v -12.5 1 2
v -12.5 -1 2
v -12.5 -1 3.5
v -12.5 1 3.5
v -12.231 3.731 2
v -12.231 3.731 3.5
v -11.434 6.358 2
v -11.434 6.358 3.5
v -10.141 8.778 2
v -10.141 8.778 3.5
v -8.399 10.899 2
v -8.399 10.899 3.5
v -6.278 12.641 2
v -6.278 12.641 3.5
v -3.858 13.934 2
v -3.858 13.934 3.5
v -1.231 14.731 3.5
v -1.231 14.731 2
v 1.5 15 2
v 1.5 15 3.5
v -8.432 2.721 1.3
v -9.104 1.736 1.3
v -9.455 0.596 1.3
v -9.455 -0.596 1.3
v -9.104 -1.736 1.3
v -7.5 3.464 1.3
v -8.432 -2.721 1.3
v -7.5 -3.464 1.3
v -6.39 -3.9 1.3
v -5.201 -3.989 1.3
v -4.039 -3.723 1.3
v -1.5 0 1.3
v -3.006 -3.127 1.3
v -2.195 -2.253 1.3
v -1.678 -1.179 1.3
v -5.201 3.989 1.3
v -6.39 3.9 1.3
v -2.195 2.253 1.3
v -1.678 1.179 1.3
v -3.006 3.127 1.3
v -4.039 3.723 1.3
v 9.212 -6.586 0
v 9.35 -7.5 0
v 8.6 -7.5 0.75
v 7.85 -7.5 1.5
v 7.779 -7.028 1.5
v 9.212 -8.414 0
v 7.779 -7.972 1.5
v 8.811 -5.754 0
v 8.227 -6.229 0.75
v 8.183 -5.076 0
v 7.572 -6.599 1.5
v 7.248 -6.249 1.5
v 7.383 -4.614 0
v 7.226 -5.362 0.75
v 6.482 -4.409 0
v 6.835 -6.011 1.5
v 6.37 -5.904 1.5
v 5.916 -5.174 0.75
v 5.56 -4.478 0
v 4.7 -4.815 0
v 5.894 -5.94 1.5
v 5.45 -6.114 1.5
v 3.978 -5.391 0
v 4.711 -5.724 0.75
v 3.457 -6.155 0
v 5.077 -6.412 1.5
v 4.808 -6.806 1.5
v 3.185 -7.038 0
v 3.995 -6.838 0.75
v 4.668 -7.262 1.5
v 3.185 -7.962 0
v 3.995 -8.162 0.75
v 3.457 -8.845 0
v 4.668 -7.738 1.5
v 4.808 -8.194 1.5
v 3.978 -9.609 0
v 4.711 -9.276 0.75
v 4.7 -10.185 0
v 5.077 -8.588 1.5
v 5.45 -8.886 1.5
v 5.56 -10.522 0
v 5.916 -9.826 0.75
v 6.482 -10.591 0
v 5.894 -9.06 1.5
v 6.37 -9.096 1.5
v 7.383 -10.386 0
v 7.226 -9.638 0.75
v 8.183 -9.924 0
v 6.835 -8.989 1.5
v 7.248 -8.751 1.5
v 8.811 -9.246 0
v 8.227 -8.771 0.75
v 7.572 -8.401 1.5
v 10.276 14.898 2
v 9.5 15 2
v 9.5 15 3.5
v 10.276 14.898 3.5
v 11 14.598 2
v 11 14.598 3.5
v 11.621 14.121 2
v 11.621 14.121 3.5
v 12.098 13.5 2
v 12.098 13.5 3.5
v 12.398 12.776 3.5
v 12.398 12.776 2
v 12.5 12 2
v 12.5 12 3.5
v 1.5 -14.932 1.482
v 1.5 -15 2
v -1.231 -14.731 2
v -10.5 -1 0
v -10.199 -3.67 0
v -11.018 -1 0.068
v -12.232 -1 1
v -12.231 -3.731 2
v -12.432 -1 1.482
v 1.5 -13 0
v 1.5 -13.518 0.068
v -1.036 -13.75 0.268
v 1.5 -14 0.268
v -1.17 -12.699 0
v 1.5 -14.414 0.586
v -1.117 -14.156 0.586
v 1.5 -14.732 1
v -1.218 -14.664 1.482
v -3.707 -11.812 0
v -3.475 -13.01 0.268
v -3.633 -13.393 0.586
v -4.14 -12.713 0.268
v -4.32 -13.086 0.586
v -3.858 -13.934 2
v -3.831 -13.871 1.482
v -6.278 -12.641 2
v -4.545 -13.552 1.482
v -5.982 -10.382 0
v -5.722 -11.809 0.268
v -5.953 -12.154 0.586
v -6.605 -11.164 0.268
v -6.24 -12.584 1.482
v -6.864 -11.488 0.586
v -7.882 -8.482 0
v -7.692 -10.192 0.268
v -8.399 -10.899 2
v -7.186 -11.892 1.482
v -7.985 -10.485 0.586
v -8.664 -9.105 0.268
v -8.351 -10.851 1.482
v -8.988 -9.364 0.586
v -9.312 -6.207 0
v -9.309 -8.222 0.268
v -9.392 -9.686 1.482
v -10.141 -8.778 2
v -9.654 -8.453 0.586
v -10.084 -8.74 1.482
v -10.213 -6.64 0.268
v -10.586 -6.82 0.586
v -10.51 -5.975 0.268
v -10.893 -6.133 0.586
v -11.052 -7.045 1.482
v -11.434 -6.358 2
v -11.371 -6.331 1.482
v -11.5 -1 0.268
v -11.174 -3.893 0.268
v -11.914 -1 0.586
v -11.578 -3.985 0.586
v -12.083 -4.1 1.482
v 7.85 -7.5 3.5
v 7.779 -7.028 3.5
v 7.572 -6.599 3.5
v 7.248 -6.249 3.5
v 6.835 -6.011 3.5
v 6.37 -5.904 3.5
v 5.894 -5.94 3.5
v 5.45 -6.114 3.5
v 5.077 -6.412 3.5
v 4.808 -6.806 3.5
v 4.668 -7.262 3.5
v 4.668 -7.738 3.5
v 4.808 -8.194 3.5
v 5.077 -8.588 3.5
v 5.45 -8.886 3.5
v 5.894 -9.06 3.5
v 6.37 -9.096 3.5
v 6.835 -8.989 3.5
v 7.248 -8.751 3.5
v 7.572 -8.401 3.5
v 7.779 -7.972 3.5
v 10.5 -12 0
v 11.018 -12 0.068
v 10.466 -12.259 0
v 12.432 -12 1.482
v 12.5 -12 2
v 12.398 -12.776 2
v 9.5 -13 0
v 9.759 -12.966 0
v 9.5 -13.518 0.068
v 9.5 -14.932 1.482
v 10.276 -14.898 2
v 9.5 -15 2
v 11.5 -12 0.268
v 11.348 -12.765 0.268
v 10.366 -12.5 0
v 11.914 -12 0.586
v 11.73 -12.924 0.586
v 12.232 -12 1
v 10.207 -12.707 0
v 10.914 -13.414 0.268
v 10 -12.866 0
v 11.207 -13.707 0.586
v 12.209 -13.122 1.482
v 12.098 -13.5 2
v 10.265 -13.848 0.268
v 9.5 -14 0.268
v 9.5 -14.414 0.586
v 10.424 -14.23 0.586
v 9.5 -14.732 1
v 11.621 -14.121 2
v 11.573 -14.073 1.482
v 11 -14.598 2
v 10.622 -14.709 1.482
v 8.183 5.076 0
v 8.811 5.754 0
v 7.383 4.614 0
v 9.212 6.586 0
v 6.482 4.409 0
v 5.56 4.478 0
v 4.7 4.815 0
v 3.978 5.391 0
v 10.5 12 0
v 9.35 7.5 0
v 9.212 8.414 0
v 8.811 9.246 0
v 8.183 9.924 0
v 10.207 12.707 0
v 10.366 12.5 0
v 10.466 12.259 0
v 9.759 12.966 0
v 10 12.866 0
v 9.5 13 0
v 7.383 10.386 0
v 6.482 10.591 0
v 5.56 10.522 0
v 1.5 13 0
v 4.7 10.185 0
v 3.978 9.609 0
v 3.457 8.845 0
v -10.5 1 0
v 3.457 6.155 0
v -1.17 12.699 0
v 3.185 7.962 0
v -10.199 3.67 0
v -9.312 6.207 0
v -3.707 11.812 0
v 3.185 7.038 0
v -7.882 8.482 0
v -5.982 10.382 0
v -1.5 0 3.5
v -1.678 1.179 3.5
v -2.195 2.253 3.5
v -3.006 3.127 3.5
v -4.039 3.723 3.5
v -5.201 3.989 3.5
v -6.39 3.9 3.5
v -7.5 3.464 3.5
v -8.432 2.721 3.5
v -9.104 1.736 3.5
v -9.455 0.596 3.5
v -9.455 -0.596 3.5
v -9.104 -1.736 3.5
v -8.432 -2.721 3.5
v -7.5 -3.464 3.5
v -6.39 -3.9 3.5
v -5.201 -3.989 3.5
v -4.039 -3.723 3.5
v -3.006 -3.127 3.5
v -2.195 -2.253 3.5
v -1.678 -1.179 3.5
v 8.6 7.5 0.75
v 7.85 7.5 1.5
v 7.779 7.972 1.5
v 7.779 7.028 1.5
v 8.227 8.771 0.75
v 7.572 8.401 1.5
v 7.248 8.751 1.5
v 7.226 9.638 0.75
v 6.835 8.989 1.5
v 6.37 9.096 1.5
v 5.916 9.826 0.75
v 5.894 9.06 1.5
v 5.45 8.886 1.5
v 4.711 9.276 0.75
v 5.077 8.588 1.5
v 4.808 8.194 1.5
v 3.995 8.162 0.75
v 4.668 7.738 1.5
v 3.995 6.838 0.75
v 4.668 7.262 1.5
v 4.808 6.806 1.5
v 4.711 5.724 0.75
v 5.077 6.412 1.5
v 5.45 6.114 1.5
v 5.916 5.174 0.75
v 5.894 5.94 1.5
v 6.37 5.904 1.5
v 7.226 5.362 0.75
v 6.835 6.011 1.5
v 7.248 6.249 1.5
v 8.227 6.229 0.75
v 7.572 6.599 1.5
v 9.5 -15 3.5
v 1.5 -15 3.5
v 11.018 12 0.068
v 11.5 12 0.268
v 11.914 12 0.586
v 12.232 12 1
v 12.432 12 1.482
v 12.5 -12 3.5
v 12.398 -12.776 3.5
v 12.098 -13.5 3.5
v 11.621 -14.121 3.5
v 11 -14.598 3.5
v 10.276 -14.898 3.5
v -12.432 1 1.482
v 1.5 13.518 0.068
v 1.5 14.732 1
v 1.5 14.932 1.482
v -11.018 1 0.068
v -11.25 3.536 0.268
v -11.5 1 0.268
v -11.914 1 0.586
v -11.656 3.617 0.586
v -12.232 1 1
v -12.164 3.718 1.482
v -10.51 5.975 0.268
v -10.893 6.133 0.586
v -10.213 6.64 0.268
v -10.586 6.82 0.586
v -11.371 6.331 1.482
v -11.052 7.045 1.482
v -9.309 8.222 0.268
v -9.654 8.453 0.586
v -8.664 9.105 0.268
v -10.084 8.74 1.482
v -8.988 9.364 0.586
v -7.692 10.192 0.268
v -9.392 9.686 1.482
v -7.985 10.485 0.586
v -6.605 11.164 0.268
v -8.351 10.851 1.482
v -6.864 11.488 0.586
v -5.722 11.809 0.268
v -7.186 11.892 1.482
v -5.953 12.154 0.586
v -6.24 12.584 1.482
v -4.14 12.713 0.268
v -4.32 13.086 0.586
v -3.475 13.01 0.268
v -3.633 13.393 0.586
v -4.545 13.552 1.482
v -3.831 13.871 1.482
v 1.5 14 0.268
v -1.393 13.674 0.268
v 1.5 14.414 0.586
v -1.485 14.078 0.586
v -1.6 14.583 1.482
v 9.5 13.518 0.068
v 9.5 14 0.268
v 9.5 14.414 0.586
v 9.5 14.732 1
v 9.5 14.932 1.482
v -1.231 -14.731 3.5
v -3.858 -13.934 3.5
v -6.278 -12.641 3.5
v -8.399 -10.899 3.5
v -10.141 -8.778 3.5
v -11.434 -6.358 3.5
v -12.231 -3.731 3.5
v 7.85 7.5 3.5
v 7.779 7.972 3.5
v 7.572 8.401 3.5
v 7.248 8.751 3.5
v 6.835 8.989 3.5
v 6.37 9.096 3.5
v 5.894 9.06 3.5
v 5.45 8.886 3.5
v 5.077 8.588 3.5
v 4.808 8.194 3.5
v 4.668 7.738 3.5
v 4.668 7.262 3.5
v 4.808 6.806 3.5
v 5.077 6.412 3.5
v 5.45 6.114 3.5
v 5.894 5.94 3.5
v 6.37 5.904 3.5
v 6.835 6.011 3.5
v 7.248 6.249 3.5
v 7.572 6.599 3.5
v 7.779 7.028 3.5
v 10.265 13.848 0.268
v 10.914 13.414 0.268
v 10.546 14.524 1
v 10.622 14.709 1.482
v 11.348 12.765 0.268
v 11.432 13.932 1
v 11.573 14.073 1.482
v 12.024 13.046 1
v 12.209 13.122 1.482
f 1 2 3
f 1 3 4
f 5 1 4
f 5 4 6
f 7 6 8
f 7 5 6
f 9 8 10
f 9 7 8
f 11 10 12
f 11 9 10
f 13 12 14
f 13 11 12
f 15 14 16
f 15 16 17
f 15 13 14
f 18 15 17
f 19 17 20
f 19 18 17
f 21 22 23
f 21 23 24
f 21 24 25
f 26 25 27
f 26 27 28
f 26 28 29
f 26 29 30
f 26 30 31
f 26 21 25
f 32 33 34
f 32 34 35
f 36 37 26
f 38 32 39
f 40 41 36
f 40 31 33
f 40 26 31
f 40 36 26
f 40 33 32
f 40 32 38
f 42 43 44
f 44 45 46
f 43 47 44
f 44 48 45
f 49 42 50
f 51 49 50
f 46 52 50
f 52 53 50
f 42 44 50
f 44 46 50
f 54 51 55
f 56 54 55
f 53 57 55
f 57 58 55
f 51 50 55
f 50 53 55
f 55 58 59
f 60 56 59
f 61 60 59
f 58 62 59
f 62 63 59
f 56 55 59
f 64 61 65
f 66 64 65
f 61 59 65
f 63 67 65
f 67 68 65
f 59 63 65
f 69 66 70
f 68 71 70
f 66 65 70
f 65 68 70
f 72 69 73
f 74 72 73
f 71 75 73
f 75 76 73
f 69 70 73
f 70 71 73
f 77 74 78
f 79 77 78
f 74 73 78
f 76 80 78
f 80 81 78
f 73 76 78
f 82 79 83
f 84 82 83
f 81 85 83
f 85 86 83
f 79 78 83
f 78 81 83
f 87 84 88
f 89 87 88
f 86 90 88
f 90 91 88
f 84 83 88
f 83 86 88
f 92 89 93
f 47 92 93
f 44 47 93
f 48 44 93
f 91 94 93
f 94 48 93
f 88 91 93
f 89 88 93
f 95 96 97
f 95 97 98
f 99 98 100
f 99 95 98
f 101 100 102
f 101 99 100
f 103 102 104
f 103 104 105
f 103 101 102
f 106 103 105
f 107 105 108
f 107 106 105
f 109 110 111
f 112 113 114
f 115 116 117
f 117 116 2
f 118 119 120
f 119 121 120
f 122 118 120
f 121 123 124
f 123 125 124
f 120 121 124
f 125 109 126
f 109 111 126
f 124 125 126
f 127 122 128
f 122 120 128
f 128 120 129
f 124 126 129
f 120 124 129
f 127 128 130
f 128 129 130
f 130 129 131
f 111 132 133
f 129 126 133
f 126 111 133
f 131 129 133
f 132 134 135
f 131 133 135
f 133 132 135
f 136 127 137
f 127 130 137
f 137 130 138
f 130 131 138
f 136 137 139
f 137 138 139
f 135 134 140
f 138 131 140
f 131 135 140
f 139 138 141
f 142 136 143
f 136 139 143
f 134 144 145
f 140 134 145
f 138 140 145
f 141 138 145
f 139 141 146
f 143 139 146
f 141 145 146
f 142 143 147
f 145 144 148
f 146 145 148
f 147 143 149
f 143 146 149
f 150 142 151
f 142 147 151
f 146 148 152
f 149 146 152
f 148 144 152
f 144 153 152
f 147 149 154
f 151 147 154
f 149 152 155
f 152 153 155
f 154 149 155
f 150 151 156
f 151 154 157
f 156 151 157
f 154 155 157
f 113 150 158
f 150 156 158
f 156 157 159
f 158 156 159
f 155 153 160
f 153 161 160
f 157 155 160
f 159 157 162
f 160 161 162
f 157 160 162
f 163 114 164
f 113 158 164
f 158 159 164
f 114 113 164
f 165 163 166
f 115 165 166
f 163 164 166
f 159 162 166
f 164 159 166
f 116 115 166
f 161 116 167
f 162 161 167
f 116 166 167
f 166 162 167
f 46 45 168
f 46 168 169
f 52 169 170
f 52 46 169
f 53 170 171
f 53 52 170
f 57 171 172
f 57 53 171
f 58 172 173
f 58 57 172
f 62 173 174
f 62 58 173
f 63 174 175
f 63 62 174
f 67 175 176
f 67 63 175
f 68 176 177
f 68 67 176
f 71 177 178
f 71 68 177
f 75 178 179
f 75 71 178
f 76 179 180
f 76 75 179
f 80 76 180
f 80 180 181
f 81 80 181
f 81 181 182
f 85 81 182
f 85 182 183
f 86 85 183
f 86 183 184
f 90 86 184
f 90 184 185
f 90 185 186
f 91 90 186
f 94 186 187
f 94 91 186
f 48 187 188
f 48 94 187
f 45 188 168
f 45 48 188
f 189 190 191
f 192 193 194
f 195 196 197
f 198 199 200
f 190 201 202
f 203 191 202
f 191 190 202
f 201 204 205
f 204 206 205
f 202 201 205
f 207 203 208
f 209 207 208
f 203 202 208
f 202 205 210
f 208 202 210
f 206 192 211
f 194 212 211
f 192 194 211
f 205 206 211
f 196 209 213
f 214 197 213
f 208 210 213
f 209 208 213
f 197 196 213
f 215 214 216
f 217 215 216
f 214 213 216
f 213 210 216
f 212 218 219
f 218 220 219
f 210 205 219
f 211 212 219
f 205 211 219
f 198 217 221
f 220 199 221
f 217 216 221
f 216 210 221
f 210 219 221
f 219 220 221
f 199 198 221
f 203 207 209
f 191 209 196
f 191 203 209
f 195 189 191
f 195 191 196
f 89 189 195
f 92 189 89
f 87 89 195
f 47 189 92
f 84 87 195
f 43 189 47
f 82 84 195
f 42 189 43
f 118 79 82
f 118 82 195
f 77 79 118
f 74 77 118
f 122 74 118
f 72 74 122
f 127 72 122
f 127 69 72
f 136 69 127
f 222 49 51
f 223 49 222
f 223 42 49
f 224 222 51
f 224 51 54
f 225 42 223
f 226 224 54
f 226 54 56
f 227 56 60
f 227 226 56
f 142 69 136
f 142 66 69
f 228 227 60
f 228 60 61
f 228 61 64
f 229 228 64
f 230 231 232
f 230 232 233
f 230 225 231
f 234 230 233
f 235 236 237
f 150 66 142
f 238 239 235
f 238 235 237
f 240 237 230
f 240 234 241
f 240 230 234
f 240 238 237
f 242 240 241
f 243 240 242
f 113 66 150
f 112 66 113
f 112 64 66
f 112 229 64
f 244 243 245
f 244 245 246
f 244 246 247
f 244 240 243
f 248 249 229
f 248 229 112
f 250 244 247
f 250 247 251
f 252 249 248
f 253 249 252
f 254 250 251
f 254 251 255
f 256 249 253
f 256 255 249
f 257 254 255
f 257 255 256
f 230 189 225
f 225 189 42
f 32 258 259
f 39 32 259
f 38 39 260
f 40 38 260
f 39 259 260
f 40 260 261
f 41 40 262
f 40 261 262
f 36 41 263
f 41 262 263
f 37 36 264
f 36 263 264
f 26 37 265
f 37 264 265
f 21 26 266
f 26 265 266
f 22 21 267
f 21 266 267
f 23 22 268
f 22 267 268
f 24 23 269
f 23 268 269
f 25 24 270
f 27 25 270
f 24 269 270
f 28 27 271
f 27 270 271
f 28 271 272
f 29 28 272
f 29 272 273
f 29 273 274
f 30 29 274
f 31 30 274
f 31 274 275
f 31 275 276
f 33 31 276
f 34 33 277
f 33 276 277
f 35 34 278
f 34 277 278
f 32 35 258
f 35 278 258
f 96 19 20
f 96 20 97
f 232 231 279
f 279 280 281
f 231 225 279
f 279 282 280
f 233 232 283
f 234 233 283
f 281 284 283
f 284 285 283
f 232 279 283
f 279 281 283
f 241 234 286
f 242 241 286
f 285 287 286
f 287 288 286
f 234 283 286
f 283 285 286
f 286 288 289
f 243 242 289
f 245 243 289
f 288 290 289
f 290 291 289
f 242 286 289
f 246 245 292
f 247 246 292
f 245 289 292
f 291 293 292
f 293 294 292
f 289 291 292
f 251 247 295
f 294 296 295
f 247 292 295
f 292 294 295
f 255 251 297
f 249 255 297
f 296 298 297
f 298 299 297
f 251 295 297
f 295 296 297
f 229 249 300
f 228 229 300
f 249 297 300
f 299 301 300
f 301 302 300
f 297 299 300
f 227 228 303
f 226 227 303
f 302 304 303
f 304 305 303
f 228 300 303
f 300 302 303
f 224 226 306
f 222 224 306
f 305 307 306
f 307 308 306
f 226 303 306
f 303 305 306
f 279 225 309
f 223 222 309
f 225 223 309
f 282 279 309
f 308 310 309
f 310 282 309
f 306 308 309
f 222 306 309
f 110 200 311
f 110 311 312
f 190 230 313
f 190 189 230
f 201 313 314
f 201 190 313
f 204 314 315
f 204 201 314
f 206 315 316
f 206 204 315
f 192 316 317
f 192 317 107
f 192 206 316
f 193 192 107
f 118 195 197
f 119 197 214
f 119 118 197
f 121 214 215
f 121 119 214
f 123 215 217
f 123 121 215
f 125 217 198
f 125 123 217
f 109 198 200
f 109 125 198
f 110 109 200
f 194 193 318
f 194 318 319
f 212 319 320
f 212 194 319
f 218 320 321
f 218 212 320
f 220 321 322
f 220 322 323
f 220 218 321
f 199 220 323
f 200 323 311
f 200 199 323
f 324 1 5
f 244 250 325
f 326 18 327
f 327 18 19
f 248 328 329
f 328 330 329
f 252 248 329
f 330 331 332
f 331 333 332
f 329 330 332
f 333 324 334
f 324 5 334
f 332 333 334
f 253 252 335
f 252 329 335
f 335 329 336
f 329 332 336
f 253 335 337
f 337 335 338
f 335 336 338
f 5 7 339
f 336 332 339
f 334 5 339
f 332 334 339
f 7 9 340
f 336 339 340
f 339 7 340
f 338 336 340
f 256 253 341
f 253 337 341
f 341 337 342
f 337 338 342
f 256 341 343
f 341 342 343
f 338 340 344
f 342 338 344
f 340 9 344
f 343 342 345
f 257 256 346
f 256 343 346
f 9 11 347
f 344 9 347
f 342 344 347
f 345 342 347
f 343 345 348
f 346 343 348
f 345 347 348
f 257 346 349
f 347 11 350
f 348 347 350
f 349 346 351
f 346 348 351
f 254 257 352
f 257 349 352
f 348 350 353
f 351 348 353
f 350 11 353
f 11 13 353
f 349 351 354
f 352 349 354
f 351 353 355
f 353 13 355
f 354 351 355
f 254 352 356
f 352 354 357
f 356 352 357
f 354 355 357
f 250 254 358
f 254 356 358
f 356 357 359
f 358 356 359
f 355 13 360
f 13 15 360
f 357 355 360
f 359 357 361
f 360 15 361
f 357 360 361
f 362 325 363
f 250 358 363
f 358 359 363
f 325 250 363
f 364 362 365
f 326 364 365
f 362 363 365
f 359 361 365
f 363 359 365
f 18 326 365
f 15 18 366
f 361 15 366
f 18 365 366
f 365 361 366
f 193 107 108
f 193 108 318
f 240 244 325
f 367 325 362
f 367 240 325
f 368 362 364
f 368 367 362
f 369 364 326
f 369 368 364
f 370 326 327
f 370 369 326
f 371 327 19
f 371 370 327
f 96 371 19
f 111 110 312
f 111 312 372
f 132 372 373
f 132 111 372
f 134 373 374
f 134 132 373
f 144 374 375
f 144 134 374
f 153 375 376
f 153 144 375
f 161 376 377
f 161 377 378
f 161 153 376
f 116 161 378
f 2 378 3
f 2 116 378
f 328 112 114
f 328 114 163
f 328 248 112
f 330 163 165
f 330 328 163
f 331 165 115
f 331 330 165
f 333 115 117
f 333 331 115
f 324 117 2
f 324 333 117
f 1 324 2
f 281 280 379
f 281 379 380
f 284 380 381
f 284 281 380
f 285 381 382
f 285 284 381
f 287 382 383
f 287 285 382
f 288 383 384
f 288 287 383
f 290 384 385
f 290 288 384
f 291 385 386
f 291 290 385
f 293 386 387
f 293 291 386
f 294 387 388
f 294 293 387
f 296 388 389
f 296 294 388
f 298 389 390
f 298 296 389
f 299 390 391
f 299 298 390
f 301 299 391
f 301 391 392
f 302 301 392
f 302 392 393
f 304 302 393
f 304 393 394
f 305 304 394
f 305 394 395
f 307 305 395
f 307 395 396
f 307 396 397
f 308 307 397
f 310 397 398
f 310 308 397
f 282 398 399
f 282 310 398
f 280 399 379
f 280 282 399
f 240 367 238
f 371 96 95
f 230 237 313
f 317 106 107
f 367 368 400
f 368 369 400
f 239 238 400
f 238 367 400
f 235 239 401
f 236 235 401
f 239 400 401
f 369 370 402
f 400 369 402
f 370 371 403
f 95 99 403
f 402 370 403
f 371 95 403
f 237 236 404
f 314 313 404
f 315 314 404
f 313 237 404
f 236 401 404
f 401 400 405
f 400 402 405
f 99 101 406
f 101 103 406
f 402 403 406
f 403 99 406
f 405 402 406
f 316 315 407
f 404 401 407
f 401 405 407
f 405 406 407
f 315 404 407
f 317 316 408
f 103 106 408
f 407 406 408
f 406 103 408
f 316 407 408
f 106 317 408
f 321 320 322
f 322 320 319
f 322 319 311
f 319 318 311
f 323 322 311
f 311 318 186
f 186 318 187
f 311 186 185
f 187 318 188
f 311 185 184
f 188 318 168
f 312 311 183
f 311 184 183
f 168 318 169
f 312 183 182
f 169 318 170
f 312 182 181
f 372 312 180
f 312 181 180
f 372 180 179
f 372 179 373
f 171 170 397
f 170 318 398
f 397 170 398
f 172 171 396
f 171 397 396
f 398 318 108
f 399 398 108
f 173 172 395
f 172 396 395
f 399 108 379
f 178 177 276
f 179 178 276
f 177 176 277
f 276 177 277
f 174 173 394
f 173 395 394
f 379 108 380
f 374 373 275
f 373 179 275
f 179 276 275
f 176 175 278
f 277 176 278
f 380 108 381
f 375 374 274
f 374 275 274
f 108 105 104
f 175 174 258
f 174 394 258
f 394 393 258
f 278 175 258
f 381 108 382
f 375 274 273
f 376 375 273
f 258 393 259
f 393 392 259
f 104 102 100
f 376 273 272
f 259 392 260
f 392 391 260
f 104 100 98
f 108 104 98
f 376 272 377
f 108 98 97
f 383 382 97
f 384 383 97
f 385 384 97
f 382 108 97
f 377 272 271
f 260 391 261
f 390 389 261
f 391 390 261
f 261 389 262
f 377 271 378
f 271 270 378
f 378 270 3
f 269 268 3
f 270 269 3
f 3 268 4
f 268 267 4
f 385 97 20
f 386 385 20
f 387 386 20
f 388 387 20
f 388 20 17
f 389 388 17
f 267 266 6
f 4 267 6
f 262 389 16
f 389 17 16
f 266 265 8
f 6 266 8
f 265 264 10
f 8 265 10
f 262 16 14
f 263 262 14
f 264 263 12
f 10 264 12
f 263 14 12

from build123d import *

# Parameters (mm, degrees)
SKETCH_1_R          = 1.6
EXTRUDE_1_DEPTH     = 3.5
SKETCH_2_R          = 4
CUT_EXTRUDE_1_DEPTH = 2.2
FILLET_1_R          = 2
CHAMFER_1_SIZE      = 1.5


with BuildPart() as part:
    # Эскиз1 → Бобышка-Вытянуть1 (new body)
    with BuildSketch(Plane.XY):
        with BuildLine():
            Line((1.5, 15), (9.5, 15))
            ThreePointArc((9.5, 15), (11.621320344, 14.121320344), (12.5, 12))
            Line((12.5, 12), (12.5, -12))
            ThreePointArc((12.5, -12), (11.621320344, -14.121320344), (9.5, -15))
            Line((9.5, -15), (1.5, -15))
            ThreePointArc((1.5, -15), (-8.399494937, -10.899494937), (-12.5, -1))
            Line((-12.5, -1), (-12.5, 1))
            ThreePointArc((-12.5, 1), (-8.399494937, 10.899494937), (1.5, 15))
        make_face()
        with Locations((6.25, 7.5)):
            Circle(SKETCH_1_R, mode=Mode.SUBTRACT)
        with Locations((6.25, -7.5)):
            Circle(SKETCH_1_R, mode=Mode.SUBTRACT)
    extrude(amount=EXTRUDE_1_DEPTH)

    # Эскиз2 → Вырез-Вытянуть1 (cut)
    with BuildSketch(Plane.XY.offset(3.5)):
        with Locations((-5.5, 0)):
            Circle(SKETCH_2_R)
    extrude(amount=-CUT_EXTRUDE_1_DEPTH, mode=Mode.SUBTRACT)

    # Скругление1
    fillet_1_edges = [part.edges().sort_by_distance(p)[0] for p in [
        (12.5, 0, 0),
        (11.621320344, -14.121320344, 0),
        (5.5, -15, 0),
        (-8.399494937, -10.899494937, 0),
        (-12.5, 0, 0),
        (-8.399494937, 10.899494937, 0),
        (5.5, 15, 0),
        (11.621320344, 14.121320344, 0),
    ]]
    fillet(fillet_1_edges, radius=FILLET_1_R)

    # Фаска1
    chamfer_1_edges = [part.edges().sort_by_distance(p)[0] for p in [
        (4.65, 7.5, 0),
        (4.65, -7.5, 0),
    ]]
    chamfer(chamfer_1_edges, length=CHAMFER_1_SIZE)


solid = part.part
